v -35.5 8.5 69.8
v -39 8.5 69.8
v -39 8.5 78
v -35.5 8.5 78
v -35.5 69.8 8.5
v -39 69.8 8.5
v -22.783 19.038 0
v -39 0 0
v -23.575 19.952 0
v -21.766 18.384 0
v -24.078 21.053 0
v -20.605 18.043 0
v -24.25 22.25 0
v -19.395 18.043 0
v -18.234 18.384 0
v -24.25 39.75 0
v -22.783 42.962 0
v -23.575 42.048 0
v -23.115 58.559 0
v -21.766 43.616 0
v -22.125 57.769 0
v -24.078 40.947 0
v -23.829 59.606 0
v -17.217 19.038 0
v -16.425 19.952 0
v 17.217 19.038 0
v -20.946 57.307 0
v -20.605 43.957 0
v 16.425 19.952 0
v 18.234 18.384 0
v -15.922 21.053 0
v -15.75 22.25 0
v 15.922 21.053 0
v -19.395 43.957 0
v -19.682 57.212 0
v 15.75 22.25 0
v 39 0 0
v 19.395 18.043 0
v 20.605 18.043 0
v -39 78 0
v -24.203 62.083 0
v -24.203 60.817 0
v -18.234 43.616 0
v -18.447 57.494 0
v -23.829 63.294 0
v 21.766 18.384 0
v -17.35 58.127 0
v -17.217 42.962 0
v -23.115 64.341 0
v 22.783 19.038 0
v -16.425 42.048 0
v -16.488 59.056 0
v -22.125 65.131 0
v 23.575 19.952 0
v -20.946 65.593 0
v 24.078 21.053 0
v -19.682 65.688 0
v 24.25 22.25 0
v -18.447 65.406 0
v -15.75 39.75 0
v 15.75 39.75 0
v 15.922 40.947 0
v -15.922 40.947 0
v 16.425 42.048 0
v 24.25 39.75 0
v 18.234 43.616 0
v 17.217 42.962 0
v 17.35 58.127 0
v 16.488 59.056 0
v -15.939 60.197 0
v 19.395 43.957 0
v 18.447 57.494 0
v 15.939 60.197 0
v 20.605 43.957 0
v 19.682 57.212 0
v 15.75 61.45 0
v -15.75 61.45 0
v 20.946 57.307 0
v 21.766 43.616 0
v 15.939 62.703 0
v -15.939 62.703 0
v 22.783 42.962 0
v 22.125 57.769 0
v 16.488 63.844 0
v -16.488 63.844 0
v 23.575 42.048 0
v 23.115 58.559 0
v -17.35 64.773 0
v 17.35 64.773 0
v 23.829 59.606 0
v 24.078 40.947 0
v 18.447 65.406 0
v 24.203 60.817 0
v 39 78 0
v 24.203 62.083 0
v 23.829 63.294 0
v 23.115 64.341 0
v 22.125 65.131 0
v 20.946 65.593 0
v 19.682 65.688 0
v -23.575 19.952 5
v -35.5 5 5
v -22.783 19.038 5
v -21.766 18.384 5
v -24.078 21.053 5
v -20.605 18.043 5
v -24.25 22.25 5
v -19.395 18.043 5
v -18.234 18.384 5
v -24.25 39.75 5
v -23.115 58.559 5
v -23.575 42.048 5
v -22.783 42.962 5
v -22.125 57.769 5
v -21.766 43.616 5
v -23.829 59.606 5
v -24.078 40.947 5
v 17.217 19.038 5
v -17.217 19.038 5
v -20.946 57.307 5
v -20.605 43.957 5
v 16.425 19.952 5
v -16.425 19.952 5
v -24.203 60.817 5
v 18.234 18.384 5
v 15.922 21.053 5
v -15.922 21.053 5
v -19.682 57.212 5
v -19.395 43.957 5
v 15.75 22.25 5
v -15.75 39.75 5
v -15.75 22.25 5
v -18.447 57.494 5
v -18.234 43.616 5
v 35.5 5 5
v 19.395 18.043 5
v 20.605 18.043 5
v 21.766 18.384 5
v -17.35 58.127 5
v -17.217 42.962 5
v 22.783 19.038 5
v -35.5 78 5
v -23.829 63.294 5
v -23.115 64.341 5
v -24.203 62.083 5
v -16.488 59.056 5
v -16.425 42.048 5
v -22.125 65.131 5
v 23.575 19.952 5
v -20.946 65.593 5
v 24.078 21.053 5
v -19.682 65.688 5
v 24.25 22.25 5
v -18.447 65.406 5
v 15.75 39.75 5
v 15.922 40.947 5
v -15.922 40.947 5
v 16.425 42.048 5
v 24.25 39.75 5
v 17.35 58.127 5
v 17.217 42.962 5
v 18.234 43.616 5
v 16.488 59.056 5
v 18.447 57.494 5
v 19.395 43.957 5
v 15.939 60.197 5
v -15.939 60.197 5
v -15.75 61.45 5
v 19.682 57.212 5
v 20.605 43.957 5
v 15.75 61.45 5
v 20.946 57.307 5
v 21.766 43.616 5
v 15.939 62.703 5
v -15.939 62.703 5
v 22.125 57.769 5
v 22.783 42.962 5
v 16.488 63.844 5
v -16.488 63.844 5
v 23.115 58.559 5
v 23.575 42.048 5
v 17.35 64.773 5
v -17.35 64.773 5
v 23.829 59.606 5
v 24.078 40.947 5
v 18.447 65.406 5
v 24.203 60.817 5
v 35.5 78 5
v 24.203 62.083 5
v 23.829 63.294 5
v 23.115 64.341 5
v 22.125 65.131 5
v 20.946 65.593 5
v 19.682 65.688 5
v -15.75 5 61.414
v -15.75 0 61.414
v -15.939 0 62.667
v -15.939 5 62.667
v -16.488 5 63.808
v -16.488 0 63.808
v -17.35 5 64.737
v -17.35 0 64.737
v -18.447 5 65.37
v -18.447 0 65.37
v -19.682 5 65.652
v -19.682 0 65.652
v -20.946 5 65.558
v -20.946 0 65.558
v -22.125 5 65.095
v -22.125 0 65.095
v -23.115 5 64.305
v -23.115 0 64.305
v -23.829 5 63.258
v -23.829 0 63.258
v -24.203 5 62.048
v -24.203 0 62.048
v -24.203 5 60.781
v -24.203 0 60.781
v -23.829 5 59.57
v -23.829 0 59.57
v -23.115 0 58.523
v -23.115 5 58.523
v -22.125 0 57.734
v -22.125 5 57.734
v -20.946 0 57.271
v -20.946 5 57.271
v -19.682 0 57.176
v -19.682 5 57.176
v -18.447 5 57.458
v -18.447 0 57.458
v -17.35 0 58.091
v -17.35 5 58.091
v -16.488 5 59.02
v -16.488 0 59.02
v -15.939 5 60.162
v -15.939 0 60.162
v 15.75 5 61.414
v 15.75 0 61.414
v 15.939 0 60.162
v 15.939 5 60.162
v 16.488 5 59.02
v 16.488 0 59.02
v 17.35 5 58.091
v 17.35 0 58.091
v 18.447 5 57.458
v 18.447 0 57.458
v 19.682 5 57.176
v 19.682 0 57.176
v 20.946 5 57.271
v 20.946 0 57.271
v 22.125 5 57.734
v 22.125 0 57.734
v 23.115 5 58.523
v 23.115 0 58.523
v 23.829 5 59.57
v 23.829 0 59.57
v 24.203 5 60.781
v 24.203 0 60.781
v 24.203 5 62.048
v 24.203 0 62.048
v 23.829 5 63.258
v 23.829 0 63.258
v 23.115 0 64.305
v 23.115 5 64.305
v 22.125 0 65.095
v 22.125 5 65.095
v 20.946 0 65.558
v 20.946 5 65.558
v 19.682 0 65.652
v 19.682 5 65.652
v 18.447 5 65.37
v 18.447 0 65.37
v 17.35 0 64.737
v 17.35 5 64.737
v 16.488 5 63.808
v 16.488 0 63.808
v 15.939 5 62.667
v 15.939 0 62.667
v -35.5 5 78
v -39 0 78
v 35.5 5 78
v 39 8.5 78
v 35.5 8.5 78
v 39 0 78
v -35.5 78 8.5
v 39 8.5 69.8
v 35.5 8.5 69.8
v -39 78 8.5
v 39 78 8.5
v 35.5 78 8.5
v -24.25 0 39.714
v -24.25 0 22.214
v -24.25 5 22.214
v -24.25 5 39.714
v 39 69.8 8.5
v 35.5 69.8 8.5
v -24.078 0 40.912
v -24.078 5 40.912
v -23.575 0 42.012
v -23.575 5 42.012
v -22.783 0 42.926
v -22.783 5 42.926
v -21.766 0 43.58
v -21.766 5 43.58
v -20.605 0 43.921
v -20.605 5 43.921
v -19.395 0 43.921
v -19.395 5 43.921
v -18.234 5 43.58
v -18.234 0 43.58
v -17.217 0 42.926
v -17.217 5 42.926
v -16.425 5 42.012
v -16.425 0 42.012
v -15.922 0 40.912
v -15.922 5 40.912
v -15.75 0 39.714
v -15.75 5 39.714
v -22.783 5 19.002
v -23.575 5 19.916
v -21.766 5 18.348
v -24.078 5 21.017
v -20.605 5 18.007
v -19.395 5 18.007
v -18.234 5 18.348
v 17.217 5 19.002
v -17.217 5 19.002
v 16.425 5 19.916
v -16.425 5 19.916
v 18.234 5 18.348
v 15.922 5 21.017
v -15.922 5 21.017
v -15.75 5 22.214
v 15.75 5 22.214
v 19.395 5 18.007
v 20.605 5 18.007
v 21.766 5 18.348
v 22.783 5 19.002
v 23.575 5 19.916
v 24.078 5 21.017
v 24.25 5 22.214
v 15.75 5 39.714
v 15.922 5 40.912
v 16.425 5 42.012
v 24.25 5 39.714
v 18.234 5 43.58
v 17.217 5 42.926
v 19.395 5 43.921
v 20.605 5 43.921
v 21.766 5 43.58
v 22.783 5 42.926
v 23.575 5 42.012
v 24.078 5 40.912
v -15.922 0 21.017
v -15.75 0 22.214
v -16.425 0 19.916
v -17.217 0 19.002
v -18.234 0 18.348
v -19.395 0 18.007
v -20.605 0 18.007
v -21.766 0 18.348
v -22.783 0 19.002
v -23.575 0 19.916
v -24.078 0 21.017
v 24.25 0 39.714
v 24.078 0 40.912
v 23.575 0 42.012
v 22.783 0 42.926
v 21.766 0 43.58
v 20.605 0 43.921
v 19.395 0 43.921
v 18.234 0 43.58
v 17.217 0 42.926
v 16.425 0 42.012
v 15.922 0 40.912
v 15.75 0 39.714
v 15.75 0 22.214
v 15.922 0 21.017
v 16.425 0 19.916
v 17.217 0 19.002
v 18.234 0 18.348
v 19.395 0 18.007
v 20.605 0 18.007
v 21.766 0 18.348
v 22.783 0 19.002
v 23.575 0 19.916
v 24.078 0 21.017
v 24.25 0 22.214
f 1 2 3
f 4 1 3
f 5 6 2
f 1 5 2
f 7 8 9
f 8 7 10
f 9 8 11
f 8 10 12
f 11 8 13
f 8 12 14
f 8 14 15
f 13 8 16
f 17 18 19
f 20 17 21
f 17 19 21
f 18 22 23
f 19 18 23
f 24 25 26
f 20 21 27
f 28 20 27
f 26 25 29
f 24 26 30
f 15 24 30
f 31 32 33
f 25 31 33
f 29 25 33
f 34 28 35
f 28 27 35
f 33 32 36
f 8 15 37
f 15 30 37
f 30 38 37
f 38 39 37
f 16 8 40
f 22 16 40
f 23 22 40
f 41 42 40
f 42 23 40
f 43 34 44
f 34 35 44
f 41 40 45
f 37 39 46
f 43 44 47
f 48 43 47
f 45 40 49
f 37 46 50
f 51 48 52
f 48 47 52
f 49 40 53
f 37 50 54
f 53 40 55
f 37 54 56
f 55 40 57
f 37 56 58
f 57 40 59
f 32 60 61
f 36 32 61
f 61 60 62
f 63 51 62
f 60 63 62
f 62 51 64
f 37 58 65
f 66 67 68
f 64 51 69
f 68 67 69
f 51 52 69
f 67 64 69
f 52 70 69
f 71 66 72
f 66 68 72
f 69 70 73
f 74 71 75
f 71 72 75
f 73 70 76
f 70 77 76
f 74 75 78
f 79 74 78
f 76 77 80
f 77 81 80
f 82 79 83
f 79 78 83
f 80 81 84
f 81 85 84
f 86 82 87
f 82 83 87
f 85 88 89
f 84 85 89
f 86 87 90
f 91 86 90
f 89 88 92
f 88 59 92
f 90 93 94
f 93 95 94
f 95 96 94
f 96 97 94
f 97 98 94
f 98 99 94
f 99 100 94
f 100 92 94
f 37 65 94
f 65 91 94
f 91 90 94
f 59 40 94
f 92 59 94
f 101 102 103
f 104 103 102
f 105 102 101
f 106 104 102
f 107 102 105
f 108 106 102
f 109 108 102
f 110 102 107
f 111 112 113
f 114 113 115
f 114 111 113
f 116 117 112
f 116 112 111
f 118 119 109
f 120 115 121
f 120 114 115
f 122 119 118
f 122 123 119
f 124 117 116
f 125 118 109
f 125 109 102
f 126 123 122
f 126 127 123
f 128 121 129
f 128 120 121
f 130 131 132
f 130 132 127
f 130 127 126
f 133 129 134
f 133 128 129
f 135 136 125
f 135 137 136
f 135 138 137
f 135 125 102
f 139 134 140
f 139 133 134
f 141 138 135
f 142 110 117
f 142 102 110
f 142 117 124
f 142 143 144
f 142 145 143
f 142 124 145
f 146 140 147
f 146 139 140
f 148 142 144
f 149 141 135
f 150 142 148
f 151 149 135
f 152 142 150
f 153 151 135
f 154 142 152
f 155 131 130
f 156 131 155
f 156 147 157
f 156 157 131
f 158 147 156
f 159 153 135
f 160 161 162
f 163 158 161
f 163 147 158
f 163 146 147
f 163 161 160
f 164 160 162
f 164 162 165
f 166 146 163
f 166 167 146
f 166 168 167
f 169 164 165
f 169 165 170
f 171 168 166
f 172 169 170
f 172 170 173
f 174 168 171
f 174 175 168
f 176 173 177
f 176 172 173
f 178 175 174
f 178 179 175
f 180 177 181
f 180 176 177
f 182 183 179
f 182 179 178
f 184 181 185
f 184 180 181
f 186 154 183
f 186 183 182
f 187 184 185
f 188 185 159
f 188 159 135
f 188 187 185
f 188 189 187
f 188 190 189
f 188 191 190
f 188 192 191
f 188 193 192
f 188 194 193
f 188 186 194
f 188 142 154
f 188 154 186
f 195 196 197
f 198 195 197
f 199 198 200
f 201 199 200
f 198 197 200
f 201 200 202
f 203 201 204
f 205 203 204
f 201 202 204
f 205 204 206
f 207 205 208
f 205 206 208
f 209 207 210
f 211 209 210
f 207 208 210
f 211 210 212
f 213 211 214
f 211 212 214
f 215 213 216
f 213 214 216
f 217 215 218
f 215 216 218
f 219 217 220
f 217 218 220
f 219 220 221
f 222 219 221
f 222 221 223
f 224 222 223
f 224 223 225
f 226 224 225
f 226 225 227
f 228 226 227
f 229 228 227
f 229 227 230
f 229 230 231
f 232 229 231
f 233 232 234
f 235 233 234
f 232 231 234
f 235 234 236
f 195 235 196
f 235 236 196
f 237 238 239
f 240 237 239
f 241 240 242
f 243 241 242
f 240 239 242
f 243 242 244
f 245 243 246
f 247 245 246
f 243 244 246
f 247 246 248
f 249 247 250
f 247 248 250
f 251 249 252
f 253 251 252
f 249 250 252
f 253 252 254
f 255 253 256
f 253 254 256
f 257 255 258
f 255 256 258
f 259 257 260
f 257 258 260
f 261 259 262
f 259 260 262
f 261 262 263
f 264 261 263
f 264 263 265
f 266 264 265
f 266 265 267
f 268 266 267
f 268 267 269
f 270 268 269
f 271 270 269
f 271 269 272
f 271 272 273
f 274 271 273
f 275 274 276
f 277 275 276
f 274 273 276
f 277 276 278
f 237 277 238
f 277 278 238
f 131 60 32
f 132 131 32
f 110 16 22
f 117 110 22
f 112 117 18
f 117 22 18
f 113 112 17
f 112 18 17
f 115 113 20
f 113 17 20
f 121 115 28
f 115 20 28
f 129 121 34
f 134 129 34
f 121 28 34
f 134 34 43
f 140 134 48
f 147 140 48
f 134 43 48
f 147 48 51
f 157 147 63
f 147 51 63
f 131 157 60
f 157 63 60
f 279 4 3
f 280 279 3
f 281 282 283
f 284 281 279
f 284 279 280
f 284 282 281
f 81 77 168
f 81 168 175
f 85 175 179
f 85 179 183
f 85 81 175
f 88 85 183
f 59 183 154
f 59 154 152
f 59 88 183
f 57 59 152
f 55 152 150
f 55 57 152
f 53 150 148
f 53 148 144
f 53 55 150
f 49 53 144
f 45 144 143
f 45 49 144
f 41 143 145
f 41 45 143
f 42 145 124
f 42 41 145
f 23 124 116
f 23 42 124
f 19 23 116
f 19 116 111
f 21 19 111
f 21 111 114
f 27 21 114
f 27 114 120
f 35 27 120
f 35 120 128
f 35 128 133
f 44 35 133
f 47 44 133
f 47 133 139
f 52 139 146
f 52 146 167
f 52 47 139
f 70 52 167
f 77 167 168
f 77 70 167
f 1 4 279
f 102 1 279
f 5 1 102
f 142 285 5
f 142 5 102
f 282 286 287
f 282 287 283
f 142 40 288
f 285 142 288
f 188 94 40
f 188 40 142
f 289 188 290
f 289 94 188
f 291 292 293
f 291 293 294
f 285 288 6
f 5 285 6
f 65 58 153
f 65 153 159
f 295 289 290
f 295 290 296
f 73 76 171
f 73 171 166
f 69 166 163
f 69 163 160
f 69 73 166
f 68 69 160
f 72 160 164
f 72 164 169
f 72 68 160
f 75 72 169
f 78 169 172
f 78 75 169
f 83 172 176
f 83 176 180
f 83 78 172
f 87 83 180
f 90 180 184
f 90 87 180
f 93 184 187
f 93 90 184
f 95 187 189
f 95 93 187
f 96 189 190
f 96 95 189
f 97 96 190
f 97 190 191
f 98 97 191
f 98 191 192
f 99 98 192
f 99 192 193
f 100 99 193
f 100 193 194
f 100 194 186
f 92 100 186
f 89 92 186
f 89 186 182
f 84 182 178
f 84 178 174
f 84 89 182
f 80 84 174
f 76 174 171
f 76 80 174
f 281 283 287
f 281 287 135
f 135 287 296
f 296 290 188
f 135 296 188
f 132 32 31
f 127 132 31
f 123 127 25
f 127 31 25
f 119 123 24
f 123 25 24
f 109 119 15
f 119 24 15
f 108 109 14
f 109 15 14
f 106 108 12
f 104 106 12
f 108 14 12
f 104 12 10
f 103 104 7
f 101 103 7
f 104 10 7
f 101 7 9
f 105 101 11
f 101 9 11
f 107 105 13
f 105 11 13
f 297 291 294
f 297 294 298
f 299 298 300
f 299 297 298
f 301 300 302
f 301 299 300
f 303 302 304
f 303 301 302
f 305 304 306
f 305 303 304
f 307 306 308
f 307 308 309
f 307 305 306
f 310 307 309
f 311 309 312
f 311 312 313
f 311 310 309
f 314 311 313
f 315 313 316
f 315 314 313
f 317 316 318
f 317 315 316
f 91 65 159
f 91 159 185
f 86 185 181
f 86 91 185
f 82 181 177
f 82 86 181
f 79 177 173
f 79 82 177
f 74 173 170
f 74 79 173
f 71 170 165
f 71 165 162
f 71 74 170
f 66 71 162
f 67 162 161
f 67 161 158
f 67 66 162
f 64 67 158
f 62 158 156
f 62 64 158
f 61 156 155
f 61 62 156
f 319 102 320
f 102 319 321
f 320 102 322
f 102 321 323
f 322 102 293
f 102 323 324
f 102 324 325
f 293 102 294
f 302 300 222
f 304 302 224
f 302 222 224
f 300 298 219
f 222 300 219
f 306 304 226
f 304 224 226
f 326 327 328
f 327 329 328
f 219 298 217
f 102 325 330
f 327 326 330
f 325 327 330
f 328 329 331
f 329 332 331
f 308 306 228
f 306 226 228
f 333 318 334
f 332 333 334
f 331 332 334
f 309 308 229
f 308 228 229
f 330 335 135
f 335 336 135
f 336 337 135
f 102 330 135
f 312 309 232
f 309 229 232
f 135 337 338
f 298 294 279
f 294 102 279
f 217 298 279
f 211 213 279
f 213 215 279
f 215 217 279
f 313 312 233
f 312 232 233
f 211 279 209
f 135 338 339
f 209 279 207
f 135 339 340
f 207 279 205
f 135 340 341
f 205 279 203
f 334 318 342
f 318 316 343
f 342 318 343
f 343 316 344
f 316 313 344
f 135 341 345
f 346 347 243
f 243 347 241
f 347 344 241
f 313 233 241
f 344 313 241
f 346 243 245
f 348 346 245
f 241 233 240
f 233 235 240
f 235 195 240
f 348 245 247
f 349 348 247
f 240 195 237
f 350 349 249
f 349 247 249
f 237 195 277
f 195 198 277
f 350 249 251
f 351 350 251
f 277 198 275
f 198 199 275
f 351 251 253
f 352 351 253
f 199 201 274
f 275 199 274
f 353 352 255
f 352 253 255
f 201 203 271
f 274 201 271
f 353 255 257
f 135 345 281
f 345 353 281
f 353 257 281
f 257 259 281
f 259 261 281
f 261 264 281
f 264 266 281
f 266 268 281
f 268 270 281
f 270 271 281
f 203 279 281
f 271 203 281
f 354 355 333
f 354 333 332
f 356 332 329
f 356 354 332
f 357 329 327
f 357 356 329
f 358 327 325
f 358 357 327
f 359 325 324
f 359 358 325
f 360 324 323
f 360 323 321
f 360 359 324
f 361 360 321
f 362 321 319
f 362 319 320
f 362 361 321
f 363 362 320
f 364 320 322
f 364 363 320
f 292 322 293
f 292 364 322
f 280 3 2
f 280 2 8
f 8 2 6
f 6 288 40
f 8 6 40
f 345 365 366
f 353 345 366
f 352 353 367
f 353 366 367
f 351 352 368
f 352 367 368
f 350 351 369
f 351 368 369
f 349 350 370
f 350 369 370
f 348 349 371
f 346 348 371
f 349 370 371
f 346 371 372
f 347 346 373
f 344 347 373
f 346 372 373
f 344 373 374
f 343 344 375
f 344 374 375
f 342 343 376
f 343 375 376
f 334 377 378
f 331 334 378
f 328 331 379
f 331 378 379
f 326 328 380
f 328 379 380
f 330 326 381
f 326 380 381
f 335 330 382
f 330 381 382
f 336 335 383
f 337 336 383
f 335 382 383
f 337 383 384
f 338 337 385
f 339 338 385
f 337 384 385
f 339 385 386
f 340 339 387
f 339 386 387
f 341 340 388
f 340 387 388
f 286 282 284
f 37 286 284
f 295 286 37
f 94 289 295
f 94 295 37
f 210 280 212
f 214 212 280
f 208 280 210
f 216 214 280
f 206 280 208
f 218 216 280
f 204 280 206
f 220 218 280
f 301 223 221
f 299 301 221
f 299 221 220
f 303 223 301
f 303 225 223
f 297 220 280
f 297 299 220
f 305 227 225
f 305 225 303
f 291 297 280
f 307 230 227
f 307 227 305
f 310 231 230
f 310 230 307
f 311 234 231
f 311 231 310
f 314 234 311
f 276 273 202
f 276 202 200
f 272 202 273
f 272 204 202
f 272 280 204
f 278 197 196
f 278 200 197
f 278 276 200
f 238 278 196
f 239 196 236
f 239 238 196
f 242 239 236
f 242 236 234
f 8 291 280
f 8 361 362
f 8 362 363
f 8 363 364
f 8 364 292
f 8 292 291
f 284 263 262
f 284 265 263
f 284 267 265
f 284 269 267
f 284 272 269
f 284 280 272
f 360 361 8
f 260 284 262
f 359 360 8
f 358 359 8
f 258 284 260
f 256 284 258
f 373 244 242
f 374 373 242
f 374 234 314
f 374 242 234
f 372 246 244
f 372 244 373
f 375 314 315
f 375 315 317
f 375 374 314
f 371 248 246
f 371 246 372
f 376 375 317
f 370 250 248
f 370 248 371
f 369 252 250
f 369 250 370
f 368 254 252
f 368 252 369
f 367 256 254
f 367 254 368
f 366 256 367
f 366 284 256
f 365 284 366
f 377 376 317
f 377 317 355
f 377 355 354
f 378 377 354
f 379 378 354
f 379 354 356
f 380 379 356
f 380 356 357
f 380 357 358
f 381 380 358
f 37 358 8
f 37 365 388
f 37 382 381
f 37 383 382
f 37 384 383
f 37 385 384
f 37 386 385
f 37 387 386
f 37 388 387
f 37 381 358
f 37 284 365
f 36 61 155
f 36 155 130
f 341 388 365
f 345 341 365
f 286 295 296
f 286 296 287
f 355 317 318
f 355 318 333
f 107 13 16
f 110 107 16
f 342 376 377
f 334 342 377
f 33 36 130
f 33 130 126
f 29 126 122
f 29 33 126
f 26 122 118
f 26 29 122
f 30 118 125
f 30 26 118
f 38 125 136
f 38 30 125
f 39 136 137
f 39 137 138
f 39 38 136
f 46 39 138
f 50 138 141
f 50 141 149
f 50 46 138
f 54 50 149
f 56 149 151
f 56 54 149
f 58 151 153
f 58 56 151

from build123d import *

# Parameters (mm, degrees)
SKETCH_3_W      = 78
SKETCH_3_H      = 78
SKETCH_3_R      = 4.25
EXTRUDE_1_DEPTH = 5
EXTRUDE_2_DEPTH = 3.5
SKETCH_5_W      = 78
SKETCH_5_H      = 78
SKETCH_5_R      = 4.25
EXTRUDE_3_DEPTH = 5


with BuildPart() as part:
    # 草图3 → 凸台-拉伸1 (new body)
    with BuildSketch(Plane.XY):
        with Locations((0, 39)):
            Rectangle(SKETCH_3_W, SKETCH_3_H)
        with Locations((-20, 61.45)):
            Circle(SKETCH_3_R, mode=Mode.SUBTRACT)
        with Locations(Location((20, 61.45, 0), (0, 0, 180))):
            Circle(SKETCH_3_R, mode=Mode.SUBTRACT)
        with BuildLine():
            Line((-15.75, 39.75), (-15.75, 22.25))
            ThreePointArc((-15.75, 22.25), (-20, 18), (-24.25, 22.25))
            Line((-24.25, 22.25), (-24.25, 39.75))
            ThreePointArc((-24.25, 39.75), (-20, 44), (-15.75, 39.75))
        make_face(mode=Mode.SUBTRACT)
        with BuildLine():
            Line((15.75, 39.75), (15.75, 22.25))
            ThreePointArc((15.75, 22.25), (20, 18), (24.25, 22.25))
            Line((24.25, 22.25), (24.25, 39.75))
            ThreePointArc((24.25, 39.75), (20, 44), (15.75, 39.75))
        make_face(mode=Mode.SUBTRACT)
    extrude(amount=EXTRUDE_1_DEPTH)

    # 草图4 → 凸台-拉伸2 (add)
    with BuildSketch(Plane.ZY.offset(39)):
        Polygon((5, 78), (8.5, 78), (8.5, 69.8), (69.8, 8.5), (78, 8.5), (78, 0), (5, 0), align=None)
    extrude_2 = extrude(amount=-EXTRUDE_2_DEPTH)

    # 镜向1: 凸台-拉伸2 across plane
    add(extrude_2.mirror(Plane(origin=(0, 0, 0), x_dir=(0, 0, 1), z_dir=(1, 0, 0))))

    # 草图5 → 凸台-拉伸3 (add)
    with BuildSketch(Plane.XZ):
        with Locations((0, 39)):
            Rectangle(SKETCH_5_W, SKETCH_5_H)
        with Locations((-20, 61.414216079)):
            Circle(SKETCH_5_R, mode=Mode.SUBTRACT)
        with Locations(Location((20, 61.414216079, 0), (0, 0, 180))):
            Circle(SKETCH_5_R, mode=Mode.SUBTRACT)
        with BuildLine():
            Line((-15.75, 39.714216079), (-15.75, 22.214216079))
            ThreePointArc((-15.75, 22.214216079), (-20, 17.964216079), (-24.25, 22.214216079))
            Line((-24.25, 22.214216079), (-24.25, 39.714216079))
            ThreePointArc((-24.25, 39.714216079), (-20, 43.964216079), (-15.75, 39.714216079))
        make_face(mode=Mode.SUBTRACT)
        with BuildLine():
            Line((15.75, 39.714216079), (15.75, 22.214216079))
            ThreePointArc((15.75, 22.214216079), (20, 17.964216079), (24.25, 22.214216079))
            Line((24.25, 22.214216079), (24.25, 39.714216079))
            ThreePointArc((24.25, 39.714216079), (20, 43.964216079), (15.75, 39.714216079))
        make_face(mode=Mode.SUBTRACT)
    extrude(amount=-EXTRUDE_3_DEPTH)


solid = part.part
